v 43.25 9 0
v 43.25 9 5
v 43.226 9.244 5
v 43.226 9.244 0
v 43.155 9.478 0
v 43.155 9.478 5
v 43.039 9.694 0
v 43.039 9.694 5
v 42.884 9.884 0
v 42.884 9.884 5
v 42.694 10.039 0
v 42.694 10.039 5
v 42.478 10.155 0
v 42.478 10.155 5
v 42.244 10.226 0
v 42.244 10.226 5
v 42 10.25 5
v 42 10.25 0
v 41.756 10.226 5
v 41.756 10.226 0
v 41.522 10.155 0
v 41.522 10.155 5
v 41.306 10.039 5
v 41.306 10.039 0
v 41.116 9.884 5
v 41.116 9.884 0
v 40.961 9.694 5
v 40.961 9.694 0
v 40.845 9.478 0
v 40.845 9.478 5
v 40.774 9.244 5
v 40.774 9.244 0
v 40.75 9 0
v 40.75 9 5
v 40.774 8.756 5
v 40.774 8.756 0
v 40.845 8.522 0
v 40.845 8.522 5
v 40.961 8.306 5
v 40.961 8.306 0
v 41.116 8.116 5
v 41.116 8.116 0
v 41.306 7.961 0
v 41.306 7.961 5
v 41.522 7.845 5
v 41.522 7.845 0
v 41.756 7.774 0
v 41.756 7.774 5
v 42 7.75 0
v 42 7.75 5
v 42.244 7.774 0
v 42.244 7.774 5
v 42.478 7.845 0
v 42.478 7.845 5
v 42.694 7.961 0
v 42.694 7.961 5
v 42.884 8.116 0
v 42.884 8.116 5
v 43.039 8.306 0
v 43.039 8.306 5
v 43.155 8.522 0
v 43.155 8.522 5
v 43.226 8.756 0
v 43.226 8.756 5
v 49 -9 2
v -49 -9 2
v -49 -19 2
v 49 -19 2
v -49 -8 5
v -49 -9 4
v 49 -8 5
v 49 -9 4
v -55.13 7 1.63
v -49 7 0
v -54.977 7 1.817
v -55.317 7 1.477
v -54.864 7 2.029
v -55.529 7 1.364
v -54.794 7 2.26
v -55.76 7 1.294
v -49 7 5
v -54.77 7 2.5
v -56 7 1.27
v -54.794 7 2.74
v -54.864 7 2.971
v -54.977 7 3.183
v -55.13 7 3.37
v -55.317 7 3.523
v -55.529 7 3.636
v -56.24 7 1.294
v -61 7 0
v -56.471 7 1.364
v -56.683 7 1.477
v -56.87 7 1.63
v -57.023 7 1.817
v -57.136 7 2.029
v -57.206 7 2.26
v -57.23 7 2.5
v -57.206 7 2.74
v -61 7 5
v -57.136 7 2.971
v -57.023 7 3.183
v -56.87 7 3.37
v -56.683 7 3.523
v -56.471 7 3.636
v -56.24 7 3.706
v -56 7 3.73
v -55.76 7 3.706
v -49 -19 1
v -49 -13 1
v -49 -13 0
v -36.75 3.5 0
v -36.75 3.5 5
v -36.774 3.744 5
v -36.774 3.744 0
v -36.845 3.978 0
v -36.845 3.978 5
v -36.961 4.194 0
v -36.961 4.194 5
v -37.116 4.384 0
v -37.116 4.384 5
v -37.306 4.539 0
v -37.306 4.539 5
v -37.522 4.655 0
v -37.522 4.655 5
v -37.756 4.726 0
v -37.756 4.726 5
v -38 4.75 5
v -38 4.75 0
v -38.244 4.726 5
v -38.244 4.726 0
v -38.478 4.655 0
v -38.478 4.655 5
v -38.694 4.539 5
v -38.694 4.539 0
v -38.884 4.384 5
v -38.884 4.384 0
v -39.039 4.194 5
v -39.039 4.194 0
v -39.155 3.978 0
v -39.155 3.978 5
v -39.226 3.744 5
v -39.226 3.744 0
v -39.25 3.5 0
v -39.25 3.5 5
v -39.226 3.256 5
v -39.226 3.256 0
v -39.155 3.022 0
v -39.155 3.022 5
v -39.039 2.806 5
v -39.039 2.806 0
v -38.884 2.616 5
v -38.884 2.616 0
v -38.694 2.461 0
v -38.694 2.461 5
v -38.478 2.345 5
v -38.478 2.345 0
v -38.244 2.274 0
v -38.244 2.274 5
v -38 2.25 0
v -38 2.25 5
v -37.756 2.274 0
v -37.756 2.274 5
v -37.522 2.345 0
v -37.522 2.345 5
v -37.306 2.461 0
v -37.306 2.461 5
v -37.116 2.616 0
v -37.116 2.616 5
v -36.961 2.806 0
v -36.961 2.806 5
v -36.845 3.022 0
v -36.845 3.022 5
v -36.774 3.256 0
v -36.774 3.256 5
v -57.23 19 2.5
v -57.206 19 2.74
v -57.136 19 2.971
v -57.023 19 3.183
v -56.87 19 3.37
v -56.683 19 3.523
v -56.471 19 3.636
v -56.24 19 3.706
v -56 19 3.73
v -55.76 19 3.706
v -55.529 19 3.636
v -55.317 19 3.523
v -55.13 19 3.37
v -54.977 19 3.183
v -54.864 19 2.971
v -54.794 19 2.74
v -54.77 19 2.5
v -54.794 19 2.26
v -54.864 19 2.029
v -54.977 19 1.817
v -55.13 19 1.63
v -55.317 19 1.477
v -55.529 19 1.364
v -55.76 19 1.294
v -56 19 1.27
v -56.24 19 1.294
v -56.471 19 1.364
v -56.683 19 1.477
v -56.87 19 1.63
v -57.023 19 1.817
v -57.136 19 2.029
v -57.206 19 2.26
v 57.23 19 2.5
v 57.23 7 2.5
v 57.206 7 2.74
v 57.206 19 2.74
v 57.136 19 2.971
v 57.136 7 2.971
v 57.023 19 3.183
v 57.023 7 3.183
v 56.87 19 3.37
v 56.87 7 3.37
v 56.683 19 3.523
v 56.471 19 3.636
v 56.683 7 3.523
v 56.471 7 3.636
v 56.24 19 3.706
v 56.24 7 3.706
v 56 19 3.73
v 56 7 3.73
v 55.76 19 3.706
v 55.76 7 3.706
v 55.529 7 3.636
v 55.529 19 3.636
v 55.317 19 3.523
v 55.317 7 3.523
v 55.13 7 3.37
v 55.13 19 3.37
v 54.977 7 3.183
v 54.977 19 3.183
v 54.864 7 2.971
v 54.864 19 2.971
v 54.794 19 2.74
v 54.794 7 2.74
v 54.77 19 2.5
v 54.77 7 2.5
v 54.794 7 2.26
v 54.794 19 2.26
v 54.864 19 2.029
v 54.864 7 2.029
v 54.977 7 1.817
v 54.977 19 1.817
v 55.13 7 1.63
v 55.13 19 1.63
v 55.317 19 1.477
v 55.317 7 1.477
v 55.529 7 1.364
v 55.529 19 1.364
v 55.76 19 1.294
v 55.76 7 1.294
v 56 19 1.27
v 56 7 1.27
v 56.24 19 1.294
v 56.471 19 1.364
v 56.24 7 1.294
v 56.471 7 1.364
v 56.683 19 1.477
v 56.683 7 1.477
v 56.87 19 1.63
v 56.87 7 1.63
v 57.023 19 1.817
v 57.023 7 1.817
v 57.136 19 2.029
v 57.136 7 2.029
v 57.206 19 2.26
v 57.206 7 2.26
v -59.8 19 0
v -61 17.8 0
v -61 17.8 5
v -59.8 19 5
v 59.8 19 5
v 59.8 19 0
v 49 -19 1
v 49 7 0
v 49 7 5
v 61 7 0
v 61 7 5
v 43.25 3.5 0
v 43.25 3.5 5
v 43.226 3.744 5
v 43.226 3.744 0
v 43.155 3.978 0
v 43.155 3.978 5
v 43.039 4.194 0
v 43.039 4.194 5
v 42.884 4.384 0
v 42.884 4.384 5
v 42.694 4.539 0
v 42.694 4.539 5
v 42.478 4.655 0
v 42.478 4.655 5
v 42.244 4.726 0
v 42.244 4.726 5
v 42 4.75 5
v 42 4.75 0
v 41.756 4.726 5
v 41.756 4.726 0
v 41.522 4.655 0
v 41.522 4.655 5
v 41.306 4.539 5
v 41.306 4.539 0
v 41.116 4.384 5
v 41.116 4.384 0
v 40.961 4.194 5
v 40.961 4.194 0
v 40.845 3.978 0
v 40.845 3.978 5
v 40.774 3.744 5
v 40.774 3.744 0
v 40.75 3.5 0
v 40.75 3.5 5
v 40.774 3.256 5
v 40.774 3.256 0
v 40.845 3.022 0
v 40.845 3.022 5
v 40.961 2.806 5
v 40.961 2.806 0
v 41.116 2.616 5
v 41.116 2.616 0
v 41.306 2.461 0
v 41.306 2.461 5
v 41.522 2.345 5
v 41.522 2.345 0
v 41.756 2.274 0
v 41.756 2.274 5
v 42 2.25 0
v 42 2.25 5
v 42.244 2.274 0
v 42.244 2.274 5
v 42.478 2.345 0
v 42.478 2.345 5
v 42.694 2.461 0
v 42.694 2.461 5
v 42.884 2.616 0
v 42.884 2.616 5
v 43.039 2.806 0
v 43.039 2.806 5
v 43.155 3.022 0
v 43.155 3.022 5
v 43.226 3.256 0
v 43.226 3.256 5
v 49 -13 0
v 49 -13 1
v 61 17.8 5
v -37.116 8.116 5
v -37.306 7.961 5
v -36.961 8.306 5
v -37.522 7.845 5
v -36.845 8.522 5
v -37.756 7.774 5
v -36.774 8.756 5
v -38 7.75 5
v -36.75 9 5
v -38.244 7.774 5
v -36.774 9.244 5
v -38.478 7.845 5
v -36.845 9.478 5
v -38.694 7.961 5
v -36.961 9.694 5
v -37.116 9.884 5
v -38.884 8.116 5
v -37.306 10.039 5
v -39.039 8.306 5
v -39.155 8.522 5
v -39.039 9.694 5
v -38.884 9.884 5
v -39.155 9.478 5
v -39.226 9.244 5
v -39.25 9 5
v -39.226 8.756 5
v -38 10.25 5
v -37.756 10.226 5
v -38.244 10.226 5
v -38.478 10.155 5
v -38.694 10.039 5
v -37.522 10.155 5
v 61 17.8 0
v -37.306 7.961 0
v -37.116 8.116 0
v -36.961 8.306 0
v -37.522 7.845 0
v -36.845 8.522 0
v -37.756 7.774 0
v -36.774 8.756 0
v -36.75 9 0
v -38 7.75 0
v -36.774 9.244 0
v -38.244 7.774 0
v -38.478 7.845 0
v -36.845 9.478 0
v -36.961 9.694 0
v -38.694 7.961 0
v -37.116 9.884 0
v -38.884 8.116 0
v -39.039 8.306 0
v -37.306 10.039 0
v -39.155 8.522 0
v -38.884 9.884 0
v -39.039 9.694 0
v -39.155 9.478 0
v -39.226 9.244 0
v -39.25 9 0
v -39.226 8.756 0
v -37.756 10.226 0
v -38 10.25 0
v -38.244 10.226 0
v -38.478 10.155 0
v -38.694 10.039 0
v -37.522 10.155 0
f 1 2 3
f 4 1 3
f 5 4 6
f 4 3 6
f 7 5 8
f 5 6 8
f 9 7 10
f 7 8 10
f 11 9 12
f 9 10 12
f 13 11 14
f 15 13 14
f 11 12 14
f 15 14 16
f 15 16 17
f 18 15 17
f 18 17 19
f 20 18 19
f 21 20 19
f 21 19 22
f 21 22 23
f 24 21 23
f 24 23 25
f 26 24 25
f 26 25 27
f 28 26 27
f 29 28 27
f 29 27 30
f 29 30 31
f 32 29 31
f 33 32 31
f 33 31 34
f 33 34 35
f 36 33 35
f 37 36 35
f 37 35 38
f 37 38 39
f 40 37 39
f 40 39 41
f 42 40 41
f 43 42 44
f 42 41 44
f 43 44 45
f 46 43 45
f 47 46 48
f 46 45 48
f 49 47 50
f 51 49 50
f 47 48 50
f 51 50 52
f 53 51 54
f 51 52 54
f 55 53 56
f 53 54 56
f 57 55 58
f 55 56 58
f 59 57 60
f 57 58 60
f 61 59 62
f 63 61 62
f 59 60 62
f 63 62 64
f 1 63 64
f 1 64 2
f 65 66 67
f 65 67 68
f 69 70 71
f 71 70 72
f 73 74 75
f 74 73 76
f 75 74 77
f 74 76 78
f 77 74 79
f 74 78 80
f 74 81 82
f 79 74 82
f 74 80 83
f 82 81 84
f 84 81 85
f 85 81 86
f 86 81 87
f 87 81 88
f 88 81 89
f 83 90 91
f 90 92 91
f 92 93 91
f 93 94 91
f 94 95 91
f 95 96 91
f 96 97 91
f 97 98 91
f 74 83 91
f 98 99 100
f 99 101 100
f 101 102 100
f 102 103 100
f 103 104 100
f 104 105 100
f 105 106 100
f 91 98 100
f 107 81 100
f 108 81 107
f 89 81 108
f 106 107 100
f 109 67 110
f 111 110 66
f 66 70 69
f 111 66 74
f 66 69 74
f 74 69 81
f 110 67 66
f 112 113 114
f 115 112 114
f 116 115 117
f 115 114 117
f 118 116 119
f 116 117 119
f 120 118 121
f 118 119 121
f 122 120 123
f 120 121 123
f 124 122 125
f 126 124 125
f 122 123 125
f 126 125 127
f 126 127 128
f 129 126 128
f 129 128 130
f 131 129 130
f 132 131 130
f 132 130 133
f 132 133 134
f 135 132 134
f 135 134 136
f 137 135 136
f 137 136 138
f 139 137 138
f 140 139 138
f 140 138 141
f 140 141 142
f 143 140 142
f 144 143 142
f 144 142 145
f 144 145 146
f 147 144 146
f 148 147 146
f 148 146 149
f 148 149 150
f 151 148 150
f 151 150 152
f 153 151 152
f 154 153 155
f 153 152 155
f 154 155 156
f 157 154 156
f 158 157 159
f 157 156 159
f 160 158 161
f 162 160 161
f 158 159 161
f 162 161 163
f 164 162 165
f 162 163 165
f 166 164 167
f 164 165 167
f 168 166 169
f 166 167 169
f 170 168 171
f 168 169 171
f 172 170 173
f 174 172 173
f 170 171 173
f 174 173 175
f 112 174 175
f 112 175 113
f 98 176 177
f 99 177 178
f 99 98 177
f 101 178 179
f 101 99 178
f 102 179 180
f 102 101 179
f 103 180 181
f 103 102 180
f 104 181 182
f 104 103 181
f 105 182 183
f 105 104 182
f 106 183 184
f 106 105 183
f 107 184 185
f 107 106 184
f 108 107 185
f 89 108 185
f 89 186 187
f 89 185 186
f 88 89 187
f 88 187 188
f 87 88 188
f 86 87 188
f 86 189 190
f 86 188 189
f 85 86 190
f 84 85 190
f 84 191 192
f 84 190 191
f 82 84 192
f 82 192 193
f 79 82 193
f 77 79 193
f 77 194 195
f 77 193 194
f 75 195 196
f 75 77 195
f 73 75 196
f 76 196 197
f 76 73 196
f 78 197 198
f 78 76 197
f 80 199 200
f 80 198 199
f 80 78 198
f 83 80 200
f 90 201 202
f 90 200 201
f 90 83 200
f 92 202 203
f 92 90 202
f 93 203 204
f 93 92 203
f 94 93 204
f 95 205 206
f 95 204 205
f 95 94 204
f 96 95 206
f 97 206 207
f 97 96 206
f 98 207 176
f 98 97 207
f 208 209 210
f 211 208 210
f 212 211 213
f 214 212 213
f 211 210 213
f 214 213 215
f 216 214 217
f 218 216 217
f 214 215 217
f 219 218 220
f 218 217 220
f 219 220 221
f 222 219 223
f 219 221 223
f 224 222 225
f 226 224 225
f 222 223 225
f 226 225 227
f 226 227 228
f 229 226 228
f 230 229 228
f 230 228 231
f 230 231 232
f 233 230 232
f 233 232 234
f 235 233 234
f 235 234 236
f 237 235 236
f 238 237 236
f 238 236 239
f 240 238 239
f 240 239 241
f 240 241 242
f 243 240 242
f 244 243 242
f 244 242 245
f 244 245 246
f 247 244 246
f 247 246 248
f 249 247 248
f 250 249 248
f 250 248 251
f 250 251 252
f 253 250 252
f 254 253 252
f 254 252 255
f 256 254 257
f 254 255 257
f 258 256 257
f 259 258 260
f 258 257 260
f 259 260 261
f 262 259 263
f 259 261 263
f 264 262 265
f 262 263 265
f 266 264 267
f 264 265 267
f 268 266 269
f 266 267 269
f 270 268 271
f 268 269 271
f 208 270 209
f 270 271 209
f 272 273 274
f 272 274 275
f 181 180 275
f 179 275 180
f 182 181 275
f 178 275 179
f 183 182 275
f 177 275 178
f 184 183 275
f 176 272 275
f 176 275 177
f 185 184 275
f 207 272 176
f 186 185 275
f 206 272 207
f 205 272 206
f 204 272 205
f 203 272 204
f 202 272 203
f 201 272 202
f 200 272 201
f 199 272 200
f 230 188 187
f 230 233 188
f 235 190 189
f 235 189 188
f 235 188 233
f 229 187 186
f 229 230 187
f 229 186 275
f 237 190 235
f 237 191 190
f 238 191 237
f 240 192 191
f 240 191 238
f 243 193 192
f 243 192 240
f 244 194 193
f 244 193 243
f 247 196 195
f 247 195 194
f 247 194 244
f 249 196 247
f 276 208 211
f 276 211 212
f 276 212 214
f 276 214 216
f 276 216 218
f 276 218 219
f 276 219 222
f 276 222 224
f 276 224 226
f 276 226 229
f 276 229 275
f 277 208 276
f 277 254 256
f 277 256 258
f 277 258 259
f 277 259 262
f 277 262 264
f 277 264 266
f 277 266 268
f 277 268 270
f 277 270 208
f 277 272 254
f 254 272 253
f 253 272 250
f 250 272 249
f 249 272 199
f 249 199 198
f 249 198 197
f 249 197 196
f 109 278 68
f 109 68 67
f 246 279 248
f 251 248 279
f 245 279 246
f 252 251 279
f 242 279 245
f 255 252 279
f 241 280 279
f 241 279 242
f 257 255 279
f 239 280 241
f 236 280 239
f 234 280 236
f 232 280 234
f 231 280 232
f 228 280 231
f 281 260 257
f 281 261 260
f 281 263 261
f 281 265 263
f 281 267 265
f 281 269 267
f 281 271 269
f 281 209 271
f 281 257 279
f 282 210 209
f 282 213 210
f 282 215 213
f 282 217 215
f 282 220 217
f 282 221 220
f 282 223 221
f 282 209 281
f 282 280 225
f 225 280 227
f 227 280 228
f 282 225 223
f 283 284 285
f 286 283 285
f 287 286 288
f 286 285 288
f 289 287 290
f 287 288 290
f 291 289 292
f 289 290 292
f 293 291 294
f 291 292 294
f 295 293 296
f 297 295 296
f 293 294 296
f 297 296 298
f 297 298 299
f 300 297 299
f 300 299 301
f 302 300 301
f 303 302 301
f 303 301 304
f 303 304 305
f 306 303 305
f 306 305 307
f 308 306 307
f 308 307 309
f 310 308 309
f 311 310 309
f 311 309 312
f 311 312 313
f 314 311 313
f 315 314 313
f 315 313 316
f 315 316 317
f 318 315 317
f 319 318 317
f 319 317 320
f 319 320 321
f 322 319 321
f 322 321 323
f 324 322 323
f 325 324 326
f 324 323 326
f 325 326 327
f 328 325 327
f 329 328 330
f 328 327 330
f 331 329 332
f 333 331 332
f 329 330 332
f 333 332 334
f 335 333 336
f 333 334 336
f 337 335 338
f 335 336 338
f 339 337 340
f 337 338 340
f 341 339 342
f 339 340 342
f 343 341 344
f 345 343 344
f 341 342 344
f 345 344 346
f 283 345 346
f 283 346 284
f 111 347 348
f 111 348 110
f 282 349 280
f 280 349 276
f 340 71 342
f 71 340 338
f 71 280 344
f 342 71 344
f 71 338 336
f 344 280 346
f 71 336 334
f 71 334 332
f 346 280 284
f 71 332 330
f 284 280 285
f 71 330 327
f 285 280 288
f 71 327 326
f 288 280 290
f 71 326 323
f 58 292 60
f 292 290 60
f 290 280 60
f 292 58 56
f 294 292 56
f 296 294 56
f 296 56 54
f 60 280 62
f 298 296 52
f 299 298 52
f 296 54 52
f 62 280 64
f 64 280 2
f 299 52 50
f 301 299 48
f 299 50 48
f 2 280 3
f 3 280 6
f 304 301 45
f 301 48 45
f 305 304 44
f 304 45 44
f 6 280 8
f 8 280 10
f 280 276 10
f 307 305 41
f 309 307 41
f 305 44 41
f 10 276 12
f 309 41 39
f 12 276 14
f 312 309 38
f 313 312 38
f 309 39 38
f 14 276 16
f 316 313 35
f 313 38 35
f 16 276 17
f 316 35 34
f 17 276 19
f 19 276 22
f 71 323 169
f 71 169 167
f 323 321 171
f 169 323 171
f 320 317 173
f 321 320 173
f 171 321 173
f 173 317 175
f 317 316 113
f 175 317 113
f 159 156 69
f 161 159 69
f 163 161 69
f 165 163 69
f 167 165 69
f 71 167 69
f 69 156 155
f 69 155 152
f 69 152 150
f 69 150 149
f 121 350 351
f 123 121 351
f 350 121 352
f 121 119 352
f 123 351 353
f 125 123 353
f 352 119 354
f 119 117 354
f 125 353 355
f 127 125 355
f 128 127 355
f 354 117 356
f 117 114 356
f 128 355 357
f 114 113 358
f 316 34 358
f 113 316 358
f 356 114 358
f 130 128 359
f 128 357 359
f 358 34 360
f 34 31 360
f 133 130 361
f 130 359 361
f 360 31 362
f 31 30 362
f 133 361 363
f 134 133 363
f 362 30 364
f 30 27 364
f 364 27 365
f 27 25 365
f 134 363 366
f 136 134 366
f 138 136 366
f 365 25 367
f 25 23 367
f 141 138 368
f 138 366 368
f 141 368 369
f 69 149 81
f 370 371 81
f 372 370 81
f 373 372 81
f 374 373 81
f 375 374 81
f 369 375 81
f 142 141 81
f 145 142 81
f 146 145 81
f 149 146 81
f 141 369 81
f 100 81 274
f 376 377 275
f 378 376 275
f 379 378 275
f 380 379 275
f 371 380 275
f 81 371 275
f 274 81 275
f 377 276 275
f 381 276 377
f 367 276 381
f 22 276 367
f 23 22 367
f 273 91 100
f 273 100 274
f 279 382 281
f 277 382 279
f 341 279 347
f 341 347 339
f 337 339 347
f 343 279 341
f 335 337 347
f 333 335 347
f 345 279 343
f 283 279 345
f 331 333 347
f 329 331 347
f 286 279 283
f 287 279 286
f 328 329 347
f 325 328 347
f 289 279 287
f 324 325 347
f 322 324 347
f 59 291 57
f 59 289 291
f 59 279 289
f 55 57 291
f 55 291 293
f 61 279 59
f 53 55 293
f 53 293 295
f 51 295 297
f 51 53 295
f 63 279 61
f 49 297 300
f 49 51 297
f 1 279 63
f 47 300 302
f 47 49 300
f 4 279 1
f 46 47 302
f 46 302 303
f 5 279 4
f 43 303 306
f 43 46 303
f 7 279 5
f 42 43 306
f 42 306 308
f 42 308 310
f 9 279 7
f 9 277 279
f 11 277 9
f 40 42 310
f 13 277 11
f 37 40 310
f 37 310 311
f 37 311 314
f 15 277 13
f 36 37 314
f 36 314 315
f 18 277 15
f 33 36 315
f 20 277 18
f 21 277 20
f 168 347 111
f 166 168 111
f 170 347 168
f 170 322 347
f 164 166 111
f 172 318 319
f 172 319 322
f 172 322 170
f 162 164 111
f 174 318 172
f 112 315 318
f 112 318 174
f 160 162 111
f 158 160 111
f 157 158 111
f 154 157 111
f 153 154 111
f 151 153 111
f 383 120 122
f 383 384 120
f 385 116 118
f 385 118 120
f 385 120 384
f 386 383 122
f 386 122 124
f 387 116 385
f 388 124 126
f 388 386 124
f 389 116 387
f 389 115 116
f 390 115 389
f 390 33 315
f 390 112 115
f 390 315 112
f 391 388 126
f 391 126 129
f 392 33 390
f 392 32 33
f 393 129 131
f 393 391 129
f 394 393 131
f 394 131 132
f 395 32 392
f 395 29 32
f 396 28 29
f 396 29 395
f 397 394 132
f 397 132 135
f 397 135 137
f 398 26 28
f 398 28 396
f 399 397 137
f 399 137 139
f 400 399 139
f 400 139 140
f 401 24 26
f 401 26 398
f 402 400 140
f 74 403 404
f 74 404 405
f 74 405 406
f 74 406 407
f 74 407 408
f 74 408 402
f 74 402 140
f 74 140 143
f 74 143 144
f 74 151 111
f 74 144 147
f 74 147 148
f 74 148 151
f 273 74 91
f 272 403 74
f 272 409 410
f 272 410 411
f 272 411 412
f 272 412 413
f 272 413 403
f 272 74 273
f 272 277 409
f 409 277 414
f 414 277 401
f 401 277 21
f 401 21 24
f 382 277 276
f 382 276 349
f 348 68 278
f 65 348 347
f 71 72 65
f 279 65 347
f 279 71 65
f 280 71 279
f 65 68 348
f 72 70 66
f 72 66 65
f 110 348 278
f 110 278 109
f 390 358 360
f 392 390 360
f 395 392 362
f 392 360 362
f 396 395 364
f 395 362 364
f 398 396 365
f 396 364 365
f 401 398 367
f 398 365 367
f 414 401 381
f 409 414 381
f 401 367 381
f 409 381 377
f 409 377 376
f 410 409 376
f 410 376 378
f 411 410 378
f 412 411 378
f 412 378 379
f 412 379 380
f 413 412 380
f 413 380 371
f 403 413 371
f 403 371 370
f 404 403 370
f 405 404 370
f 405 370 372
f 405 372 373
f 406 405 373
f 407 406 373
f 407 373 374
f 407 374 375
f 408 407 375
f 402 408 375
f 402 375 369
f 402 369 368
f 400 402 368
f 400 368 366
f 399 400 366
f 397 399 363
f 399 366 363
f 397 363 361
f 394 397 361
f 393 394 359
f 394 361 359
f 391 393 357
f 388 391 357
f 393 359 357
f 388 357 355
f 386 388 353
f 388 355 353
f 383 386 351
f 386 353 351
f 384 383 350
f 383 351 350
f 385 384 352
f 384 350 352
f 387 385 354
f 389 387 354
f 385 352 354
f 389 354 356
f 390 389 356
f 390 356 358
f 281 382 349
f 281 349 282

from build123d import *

# Parameters (mm, degrees)
BOSS_EXTRUDE1_DEPTH = 5
SKETCH2_W           = 12
SKETCH2_H           = 26
CUT_EXTRUDE1_DEPTH  = 6
SKETCH3_R           = 1.25
CUT_EXTRUDE2_DEPTH  = 6
SKETCH4_R           = 1.23
CUT_EXTRUDE3_DEPTH  = 13
SKETCH5_W           = 98
SKETCH5_H           = 10
CUT_EXTRUDE4_DEPTH  = 3
SKETCH6_W           = 98
SKETCH6_H           = 6
CUT_EXTRUDE5_DEPTH  = 1
CHAMFER1_SIZE       = 1


with BuildPart() as part:
    # Sketch1 → Boss-Extrude1 (new body)
    with BuildSketch(Plane.XY):
        Polygon((-61, 17.8), (-59.8, 19), (59.8, 19), (61, 17.8), (61, -19), (-61, -19), align=None)
    extrude(amount=BOSS_EXTRUDE1_DEPTH)

    # Sketch2 → Cut-Extrude1 (cut, through all)
    with BuildSketch(Plane.XY.offset(5)):
        with Locations((55, -6)):
            Rectangle(SKETCH2_W, SKETCH2_H)
    cut_extrude1 = extrude(amount=-CUT_EXTRUDE1_DEPTH, mode=Mode.SUBTRACT)

    # Sketch3 → Cut-Extrude2 (cut, through all)
    with BuildSketch(Plane.XY.offset(5)):
        with Locations((42, 9)):
            Circle(SKETCH3_R)
        with Locations((42, 3.5)):
            Circle(SKETCH3_R)
        with Locations((-38, 9)):
            Circle(SKETCH3_R)
        with Locations((-38, 3.5)):
            Circle(SKETCH3_R)
    extrude(amount=-CUT_EXTRUDE2_DEPTH, mode=Mode.SUBTRACT)

    # Sketch4 → Cut-Extrude3 (cut, through all)
    with BuildSketch(Plane.XZ.offset(-7)):
        with Locations((56, 2.5)):
            Circle(SKETCH4_R)
    cut_extrude3 = extrude(amount=-CUT_EXTRUDE3_DEPTH, mode=Mode.SUBTRACT)

    # Mirror1: Cut-Extrude1, Cut-Extrude3 across plane
    add(cut_extrude1.mirror(Plane(origin=(0, 0, 0), x_dir=(0, 0, 1), z_dir=(1, 0, 0))), mode=Mode.SUBTRACT)
    add(cut_extrude3.mirror(Plane(origin=(0, 0, 0), x_dir=(0, 0, 1), z_dir=(1, 0, 0))), mode=Mode.SUBTRACT)

    # Sketch5 → Cut-Extrude4 (cut)
    with BuildSketch(Plane.XY.offset(5)):
        with Locations((0, -14)):
            Rectangle(SKETCH5_W, SKETCH5_H)
    extrude(amount=-CUT_EXTRUDE4_DEPTH, mode=Mode.SUBTRACT)

    # Sketch6 → Cut-Extrude5 (cut)
    with BuildSketch(Plane(origin=(0, 0, 0), x_dir=(-1, 0, 0), z_dir=(0, 0, -1))):
        with Locations((0, -16)):
            Rectangle(SKETCH6_W, SKETCH6_H)
    extrude(amount=-CUT_EXTRUDE5_DEPTH, mode=Mode.SUBTRACT)

    # Chamfer1
    chamfer1_edges = [part.edges().sort_by_distance(p)[0] for p in [
        (0, -9, 5),
    ]]
    chamfer(chamfer1_edges, length=CHAMFER1_SIZE)


solid = part.part
